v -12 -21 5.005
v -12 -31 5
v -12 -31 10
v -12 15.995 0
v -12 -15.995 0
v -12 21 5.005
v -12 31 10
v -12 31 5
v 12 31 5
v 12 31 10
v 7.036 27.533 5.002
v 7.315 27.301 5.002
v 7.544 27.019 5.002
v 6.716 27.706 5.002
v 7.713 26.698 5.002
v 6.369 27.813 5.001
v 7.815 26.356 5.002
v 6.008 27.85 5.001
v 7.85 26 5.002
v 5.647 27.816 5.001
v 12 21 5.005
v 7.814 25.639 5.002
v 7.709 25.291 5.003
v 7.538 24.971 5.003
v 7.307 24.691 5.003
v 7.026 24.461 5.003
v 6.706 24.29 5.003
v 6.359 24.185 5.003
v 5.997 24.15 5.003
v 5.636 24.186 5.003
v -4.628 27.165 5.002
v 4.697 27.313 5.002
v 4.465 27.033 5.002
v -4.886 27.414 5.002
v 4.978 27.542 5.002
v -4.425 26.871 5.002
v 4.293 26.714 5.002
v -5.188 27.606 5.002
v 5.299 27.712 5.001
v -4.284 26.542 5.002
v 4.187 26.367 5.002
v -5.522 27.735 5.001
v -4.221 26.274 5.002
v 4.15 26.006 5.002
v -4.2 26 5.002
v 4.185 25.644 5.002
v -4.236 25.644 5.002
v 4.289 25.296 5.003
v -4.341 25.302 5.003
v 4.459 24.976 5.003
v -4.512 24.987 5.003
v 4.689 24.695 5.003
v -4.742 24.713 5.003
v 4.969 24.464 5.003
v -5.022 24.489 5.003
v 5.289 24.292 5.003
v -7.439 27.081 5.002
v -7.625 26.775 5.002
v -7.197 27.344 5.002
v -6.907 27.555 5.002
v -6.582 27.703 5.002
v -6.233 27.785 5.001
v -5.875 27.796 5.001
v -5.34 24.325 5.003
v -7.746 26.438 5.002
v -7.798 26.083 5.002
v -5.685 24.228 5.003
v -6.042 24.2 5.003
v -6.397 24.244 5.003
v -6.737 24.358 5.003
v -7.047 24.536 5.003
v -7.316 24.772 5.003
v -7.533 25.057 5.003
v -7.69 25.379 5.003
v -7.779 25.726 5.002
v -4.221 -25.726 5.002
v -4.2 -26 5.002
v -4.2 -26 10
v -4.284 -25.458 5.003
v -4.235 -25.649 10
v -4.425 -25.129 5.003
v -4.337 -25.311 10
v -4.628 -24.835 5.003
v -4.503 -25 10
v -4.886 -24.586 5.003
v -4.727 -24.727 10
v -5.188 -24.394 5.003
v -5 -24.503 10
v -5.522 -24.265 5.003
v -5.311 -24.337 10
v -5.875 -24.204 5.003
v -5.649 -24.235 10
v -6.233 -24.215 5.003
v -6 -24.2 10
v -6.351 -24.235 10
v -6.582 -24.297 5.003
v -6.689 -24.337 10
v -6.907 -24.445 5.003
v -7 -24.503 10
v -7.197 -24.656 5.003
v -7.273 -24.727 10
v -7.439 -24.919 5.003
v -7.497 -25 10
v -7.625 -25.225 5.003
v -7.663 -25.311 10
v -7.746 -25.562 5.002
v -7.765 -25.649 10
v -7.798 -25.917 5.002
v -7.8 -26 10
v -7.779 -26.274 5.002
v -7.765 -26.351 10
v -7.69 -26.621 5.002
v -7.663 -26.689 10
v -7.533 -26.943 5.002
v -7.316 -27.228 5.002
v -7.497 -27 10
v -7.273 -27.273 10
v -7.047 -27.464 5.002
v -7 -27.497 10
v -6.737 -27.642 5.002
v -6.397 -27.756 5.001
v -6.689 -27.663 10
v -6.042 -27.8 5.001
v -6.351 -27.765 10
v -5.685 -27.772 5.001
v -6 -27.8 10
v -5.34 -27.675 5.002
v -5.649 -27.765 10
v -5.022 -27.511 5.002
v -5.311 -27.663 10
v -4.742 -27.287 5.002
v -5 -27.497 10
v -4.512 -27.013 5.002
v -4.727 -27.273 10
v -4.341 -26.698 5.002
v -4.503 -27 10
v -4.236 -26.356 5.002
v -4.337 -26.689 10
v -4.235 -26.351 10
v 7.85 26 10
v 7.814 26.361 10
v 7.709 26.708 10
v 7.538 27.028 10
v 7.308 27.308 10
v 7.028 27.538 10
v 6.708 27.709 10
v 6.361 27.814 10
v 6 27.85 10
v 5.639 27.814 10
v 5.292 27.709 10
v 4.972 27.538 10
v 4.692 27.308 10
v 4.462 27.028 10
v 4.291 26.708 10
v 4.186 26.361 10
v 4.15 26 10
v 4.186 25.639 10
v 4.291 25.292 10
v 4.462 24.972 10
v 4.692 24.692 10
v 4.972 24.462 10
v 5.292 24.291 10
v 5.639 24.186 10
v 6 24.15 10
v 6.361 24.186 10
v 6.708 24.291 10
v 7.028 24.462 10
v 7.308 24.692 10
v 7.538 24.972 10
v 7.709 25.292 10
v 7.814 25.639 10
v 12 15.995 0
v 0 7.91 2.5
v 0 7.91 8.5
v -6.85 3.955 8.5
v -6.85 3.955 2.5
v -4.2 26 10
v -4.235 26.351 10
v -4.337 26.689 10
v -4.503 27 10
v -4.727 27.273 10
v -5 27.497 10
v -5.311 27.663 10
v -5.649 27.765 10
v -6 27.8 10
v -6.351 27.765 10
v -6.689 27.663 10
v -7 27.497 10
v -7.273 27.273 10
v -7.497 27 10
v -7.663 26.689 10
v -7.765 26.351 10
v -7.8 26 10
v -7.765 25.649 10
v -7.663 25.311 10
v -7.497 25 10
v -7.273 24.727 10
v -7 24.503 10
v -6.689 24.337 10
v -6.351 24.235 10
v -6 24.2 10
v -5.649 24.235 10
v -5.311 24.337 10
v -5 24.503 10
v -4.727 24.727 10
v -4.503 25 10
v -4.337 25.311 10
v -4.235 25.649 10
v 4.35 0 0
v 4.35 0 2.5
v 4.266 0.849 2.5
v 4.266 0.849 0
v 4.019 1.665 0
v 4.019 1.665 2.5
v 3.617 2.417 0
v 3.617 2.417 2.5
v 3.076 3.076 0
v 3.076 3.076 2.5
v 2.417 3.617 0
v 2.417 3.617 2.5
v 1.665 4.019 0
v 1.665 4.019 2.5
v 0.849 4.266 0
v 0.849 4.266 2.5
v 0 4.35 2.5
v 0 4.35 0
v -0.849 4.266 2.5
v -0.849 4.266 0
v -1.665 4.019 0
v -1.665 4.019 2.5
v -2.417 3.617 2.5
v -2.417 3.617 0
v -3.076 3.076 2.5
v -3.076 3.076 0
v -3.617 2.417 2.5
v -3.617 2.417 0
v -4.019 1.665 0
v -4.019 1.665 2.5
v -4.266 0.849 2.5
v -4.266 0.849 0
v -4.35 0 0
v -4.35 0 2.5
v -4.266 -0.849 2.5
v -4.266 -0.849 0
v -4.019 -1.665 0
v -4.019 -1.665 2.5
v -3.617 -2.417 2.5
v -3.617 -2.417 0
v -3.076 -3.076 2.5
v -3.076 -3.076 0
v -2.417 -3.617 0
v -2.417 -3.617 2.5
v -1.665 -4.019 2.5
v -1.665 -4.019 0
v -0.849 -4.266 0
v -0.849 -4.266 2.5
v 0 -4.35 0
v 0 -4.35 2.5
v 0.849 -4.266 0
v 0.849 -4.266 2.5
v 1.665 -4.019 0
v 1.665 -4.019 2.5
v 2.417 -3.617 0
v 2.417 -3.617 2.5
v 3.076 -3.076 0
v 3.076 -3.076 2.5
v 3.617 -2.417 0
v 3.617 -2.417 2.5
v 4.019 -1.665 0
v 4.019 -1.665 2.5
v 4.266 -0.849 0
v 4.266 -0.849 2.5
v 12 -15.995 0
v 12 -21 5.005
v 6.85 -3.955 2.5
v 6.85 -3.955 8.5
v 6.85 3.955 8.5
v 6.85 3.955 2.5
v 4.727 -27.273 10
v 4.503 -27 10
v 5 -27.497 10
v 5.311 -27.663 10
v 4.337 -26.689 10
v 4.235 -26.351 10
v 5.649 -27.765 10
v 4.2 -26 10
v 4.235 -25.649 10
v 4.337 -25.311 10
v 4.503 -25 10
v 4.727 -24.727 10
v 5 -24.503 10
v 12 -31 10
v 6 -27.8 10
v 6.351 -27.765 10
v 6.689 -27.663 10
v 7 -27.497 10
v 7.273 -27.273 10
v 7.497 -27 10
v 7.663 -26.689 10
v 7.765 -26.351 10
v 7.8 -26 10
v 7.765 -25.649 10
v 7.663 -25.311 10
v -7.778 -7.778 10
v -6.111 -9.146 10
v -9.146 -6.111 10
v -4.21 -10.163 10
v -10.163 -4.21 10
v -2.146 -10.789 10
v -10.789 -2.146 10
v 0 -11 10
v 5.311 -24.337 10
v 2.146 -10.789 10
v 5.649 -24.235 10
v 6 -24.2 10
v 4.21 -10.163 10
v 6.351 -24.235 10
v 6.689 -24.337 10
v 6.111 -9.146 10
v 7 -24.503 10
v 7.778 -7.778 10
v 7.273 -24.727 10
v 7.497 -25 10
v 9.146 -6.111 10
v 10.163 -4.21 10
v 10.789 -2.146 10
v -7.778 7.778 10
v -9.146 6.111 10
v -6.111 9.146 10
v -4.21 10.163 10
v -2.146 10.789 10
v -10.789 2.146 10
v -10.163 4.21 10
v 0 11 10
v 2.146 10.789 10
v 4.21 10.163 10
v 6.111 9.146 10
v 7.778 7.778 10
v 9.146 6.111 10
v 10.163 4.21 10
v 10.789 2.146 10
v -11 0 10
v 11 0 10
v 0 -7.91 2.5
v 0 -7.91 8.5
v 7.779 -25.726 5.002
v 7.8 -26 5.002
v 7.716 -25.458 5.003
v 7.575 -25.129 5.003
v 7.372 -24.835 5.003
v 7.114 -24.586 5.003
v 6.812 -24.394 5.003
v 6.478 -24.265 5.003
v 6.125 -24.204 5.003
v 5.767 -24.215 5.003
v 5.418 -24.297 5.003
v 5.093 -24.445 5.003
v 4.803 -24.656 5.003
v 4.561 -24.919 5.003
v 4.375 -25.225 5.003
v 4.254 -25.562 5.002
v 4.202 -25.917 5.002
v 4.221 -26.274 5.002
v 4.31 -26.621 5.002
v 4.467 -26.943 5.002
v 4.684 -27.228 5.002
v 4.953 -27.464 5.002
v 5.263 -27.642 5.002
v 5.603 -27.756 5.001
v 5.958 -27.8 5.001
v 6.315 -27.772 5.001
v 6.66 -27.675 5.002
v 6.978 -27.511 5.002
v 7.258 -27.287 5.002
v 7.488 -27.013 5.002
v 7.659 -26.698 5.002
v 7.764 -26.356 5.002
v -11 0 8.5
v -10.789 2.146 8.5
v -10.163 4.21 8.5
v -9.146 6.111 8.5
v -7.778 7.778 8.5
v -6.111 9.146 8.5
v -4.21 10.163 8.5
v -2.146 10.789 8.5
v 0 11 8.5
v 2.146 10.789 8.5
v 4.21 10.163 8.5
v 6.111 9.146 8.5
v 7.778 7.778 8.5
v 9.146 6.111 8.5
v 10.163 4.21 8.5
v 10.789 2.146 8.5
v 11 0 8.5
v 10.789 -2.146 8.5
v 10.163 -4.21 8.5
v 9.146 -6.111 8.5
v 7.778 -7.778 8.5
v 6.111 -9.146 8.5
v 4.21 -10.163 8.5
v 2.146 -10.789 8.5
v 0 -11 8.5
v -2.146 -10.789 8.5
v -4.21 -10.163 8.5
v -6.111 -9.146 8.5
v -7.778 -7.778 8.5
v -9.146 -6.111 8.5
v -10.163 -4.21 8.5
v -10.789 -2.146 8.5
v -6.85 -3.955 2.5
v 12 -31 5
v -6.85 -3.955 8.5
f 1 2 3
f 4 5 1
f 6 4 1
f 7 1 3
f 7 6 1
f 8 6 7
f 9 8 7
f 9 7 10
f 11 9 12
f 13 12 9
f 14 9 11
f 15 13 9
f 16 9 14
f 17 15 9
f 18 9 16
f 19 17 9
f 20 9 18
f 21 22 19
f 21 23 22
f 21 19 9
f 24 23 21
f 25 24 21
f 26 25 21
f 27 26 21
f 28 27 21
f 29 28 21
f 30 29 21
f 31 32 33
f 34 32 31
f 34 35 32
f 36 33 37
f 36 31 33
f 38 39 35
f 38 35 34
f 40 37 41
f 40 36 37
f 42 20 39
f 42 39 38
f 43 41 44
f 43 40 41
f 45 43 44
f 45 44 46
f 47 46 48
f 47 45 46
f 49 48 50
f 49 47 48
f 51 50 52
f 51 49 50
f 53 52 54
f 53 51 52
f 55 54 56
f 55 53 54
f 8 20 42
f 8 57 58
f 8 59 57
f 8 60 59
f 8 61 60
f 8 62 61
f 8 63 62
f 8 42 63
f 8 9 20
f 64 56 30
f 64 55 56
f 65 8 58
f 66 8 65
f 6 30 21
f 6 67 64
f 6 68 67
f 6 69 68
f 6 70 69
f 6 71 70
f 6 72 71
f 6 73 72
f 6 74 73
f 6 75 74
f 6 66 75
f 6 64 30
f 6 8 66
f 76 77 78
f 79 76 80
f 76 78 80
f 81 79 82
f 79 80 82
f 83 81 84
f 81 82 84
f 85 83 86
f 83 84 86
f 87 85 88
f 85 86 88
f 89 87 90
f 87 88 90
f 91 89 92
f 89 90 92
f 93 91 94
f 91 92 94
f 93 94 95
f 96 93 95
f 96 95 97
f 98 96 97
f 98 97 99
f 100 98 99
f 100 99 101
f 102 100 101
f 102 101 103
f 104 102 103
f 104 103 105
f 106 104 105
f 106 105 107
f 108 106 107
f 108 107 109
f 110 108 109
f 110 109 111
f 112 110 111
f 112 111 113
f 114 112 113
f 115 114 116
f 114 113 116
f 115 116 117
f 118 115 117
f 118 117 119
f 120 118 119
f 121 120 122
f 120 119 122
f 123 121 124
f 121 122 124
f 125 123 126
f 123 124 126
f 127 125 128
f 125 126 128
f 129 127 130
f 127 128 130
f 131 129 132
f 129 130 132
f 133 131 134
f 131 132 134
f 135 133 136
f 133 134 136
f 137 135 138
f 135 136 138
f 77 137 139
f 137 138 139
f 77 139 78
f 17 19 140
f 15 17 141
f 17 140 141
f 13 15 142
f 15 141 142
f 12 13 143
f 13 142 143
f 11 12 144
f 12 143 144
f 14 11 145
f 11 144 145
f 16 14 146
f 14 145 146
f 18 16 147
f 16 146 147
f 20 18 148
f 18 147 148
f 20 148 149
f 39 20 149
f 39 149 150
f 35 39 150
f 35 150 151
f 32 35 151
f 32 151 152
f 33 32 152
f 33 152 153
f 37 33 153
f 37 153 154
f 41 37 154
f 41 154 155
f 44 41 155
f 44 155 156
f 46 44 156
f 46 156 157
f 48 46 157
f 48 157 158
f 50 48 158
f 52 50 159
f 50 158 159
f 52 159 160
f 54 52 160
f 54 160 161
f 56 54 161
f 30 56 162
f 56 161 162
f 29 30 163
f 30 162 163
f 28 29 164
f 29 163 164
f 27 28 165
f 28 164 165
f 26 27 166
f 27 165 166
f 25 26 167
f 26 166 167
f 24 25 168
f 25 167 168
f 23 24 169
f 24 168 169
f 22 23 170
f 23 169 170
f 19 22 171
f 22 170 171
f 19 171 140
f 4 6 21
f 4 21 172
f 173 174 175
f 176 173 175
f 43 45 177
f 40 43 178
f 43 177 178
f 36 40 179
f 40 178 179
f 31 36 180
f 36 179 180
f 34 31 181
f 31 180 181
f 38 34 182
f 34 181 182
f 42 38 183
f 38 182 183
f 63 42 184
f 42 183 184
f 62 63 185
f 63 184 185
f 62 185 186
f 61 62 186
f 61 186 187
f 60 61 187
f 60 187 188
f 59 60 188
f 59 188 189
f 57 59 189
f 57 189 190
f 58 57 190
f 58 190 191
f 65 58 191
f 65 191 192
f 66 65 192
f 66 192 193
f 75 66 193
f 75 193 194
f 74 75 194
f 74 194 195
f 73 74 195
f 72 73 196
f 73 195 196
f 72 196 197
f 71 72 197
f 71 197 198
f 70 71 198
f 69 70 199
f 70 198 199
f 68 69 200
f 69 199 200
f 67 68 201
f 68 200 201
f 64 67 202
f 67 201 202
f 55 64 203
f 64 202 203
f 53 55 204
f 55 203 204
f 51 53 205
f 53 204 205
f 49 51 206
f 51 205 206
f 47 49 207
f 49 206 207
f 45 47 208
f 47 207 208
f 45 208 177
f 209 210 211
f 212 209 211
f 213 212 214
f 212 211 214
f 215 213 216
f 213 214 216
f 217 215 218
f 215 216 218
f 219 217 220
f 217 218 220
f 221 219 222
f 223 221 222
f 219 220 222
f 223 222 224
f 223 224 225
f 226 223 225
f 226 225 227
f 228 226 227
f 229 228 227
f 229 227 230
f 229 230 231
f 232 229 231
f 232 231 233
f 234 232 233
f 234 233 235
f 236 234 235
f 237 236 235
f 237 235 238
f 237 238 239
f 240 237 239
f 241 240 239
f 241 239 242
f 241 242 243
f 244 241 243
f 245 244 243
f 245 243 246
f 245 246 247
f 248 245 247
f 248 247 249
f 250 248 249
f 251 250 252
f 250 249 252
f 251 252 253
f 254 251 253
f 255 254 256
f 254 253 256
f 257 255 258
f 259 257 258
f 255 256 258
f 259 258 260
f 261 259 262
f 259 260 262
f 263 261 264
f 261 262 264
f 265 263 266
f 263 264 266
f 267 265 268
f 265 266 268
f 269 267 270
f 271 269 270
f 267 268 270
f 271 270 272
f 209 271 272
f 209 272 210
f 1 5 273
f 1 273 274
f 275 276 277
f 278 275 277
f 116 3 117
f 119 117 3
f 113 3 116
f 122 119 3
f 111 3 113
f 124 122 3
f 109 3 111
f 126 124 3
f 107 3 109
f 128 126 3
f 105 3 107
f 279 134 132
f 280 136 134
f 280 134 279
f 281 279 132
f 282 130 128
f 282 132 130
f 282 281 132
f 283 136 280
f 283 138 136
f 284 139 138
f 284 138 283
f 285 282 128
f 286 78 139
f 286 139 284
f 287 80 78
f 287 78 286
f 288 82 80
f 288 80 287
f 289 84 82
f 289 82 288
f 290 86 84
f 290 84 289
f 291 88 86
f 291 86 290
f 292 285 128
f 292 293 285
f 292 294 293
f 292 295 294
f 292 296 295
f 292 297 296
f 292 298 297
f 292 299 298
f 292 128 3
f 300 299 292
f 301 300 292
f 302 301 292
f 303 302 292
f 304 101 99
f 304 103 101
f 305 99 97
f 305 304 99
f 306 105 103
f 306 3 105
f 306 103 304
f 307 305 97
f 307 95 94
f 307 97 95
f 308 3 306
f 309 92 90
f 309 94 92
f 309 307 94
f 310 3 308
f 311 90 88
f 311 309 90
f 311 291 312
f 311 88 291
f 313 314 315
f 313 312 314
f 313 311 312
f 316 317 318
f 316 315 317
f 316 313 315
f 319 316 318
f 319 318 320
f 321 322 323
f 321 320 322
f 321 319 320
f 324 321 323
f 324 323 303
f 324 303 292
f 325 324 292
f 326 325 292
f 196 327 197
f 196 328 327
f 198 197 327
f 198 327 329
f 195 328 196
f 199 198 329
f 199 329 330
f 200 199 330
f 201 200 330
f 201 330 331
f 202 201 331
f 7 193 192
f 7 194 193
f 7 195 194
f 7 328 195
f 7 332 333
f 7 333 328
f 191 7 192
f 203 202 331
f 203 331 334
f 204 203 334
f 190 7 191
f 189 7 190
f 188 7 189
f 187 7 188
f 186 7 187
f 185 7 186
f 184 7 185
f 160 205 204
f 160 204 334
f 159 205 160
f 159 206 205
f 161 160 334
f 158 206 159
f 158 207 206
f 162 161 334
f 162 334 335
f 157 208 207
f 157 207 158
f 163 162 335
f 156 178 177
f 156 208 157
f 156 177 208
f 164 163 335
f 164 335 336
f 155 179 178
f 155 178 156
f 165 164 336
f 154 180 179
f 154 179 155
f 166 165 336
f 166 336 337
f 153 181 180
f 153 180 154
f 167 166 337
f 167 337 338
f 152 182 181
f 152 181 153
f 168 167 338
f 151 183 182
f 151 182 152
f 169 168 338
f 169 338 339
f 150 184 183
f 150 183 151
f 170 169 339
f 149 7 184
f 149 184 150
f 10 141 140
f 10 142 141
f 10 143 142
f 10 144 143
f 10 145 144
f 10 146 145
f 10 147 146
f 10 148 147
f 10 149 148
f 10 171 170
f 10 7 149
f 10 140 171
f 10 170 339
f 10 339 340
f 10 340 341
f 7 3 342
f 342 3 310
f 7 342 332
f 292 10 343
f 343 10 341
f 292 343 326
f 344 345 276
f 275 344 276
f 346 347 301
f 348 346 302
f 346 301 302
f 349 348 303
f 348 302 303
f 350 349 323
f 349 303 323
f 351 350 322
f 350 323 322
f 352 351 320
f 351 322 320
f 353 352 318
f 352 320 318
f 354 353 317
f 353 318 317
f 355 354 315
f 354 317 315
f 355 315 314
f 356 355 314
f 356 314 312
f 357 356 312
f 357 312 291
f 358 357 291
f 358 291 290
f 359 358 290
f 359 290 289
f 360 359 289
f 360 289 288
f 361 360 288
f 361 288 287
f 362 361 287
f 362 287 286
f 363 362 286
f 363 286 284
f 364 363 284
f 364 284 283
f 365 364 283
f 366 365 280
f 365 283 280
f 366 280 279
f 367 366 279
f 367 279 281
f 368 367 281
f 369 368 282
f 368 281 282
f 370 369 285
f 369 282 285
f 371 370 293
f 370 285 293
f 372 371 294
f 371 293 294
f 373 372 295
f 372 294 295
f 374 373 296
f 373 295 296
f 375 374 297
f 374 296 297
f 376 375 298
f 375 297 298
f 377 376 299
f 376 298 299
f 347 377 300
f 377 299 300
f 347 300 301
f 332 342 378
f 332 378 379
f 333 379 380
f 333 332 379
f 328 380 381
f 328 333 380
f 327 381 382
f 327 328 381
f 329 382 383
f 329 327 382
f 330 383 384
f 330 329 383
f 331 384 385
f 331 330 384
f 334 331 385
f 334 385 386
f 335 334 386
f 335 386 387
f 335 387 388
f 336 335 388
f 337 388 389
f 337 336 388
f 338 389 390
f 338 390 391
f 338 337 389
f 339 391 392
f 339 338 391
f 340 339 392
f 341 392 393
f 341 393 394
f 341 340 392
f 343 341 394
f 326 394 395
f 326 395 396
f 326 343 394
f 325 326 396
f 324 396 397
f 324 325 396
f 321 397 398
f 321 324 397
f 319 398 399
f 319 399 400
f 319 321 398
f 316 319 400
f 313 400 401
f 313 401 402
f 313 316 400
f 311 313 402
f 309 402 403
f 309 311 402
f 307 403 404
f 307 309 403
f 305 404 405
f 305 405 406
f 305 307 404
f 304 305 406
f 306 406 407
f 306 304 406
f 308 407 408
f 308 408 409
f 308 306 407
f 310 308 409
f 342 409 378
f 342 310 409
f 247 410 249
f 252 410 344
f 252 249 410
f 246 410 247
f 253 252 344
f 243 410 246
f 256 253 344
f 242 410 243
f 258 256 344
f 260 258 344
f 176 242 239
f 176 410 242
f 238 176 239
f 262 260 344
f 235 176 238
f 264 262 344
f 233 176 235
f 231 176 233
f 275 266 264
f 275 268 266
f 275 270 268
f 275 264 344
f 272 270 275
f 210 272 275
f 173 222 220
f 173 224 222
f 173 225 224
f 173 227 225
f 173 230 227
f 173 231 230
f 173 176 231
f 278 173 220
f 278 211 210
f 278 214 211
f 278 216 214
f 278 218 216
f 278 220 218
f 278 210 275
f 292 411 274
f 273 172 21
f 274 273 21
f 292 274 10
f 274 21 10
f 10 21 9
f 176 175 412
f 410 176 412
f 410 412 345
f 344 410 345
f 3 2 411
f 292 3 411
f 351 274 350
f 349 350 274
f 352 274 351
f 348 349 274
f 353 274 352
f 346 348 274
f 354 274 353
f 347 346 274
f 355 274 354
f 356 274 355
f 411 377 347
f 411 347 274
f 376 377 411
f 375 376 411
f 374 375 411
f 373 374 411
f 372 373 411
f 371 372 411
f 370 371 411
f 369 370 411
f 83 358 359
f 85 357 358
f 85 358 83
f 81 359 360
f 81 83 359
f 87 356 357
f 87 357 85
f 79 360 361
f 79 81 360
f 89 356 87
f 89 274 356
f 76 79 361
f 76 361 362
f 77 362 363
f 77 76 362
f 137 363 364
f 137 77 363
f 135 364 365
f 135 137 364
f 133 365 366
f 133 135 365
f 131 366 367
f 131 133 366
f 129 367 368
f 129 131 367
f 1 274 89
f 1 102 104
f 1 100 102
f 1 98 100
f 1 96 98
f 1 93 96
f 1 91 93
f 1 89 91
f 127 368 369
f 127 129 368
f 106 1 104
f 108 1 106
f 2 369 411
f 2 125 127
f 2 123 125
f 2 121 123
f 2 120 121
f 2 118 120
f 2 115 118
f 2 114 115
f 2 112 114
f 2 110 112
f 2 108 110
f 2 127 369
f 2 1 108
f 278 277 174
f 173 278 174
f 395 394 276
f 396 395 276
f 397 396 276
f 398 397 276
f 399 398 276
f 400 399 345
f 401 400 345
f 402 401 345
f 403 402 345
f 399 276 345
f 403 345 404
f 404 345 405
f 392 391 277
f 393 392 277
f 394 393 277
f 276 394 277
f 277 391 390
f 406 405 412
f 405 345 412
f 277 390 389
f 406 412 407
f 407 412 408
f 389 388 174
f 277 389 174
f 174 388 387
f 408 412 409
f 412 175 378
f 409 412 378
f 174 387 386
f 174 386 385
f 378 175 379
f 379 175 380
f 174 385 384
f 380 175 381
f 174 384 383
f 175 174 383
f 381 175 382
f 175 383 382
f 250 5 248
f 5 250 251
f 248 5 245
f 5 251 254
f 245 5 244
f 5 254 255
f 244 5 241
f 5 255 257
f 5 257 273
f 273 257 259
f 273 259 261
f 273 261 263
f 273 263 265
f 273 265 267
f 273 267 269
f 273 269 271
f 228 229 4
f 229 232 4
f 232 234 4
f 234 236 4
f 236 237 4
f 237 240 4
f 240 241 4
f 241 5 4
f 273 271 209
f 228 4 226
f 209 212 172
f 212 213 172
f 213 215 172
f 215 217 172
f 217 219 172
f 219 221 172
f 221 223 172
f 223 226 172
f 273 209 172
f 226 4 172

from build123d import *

# Parameters (mm, degrees)
ESBO_O1_W                = 24
ESBO_O1_H                = 62
RESSALTO_EXTRUS_O1_DEPTH = 10
ESBO_O4_R                = 11
CORTE_EXTRUS_O1_DEPTH    = 1.5
CORTE_EXTRUS_O2_DEPTH    = 6
ESBO_O9_R                = 4.35
ESBO_O9_R_2              = 1.85
ESBO_O9_R_3              = 1.8
CORTE_EXTRUS_O4_DEPTH    = 11
ESBO_O11_OUTSIDE_W       = 25.446
ESBO_O11_OUTSIDE_H       = 77.446
CORTE_EXTRUS_O7_DEPTH    = 25


with BuildPart() as part:
    # Esboço1 → Ressalto-extrusão1 (new body)
    with BuildSketch(Plane.XY):
        Rectangle(ESBO_O1_W, ESBO_O1_H)
    extrude(amount=RESSALTO_EXTRUS_O1_DEPTH)

    # Esboço4 → Corte-extrusão1 (cut)
    with BuildSketch(Plane(origin=(0, 0, 10), x_dir=(-1, 0, 0), z_dir=(0, 0, -1))):
        Circle(ESBO_O4_R)
    extrude(amount=CORTE_EXTRUS_O1_DEPTH, mode=Mode.SUBTRACT)

    # Esboço6 → Corte-extrusão2 (cut)
    with BuildSketch(Plane.XY.offset(8.5)):
        Polygon((0, -7.909698688), (6.85, -3.954849344), (6.85, 3.954849344), (0, 7.909698688), (-6.85, 3.954849344), (-6.85, -3.954849344), align=None)
    extrude(amount=-CORTE_EXTRUS_O2_DEPTH, mode=Mode.SUBTRACT)

    # Esboço9 → Corte-extrusão4 (cut, through all)
    with BuildSketch(Plane.XY.offset(10)):
        Circle(ESBO_O9_R)
        with Locations((6, 26)):
            Circle(ESBO_O9_R_2)
        with Locations((-6, 26)):
            Circle(ESBO_O9_R_3)
        with Locations((-6, -26)):
            Circle(ESBO_O9_R_3)
        with Locations((6, -26)):
            Circle(ESBO_O9_R_3)
    extrude(amount=-CORTE_EXTRUS_O4_DEPTH, mode=Mode.SUBTRACT)

    # Esboço11 outside → Corte-extrusão7 (cut, through all)
    with BuildSketch(Plane.ZY.offset(12)):
        with Locations((5, 0)):
            Rectangle(ESBO_O11_OUTSIDE_W, ESBO_O11_OUTSIDE_H)
        Polygon((5.004562024, -21), (5, -31), (10, -31), (10, 31), (5, 31), (5.004562024, 21), (0, 15.995437976), (0, -15.995437976), align=None, mode=Mode.SUBTRACT)
    extrude(amount=-CORTE_EXTRUS_O7_DEPTH, mode=Mode.SUBTRACT)


solid = part.part
